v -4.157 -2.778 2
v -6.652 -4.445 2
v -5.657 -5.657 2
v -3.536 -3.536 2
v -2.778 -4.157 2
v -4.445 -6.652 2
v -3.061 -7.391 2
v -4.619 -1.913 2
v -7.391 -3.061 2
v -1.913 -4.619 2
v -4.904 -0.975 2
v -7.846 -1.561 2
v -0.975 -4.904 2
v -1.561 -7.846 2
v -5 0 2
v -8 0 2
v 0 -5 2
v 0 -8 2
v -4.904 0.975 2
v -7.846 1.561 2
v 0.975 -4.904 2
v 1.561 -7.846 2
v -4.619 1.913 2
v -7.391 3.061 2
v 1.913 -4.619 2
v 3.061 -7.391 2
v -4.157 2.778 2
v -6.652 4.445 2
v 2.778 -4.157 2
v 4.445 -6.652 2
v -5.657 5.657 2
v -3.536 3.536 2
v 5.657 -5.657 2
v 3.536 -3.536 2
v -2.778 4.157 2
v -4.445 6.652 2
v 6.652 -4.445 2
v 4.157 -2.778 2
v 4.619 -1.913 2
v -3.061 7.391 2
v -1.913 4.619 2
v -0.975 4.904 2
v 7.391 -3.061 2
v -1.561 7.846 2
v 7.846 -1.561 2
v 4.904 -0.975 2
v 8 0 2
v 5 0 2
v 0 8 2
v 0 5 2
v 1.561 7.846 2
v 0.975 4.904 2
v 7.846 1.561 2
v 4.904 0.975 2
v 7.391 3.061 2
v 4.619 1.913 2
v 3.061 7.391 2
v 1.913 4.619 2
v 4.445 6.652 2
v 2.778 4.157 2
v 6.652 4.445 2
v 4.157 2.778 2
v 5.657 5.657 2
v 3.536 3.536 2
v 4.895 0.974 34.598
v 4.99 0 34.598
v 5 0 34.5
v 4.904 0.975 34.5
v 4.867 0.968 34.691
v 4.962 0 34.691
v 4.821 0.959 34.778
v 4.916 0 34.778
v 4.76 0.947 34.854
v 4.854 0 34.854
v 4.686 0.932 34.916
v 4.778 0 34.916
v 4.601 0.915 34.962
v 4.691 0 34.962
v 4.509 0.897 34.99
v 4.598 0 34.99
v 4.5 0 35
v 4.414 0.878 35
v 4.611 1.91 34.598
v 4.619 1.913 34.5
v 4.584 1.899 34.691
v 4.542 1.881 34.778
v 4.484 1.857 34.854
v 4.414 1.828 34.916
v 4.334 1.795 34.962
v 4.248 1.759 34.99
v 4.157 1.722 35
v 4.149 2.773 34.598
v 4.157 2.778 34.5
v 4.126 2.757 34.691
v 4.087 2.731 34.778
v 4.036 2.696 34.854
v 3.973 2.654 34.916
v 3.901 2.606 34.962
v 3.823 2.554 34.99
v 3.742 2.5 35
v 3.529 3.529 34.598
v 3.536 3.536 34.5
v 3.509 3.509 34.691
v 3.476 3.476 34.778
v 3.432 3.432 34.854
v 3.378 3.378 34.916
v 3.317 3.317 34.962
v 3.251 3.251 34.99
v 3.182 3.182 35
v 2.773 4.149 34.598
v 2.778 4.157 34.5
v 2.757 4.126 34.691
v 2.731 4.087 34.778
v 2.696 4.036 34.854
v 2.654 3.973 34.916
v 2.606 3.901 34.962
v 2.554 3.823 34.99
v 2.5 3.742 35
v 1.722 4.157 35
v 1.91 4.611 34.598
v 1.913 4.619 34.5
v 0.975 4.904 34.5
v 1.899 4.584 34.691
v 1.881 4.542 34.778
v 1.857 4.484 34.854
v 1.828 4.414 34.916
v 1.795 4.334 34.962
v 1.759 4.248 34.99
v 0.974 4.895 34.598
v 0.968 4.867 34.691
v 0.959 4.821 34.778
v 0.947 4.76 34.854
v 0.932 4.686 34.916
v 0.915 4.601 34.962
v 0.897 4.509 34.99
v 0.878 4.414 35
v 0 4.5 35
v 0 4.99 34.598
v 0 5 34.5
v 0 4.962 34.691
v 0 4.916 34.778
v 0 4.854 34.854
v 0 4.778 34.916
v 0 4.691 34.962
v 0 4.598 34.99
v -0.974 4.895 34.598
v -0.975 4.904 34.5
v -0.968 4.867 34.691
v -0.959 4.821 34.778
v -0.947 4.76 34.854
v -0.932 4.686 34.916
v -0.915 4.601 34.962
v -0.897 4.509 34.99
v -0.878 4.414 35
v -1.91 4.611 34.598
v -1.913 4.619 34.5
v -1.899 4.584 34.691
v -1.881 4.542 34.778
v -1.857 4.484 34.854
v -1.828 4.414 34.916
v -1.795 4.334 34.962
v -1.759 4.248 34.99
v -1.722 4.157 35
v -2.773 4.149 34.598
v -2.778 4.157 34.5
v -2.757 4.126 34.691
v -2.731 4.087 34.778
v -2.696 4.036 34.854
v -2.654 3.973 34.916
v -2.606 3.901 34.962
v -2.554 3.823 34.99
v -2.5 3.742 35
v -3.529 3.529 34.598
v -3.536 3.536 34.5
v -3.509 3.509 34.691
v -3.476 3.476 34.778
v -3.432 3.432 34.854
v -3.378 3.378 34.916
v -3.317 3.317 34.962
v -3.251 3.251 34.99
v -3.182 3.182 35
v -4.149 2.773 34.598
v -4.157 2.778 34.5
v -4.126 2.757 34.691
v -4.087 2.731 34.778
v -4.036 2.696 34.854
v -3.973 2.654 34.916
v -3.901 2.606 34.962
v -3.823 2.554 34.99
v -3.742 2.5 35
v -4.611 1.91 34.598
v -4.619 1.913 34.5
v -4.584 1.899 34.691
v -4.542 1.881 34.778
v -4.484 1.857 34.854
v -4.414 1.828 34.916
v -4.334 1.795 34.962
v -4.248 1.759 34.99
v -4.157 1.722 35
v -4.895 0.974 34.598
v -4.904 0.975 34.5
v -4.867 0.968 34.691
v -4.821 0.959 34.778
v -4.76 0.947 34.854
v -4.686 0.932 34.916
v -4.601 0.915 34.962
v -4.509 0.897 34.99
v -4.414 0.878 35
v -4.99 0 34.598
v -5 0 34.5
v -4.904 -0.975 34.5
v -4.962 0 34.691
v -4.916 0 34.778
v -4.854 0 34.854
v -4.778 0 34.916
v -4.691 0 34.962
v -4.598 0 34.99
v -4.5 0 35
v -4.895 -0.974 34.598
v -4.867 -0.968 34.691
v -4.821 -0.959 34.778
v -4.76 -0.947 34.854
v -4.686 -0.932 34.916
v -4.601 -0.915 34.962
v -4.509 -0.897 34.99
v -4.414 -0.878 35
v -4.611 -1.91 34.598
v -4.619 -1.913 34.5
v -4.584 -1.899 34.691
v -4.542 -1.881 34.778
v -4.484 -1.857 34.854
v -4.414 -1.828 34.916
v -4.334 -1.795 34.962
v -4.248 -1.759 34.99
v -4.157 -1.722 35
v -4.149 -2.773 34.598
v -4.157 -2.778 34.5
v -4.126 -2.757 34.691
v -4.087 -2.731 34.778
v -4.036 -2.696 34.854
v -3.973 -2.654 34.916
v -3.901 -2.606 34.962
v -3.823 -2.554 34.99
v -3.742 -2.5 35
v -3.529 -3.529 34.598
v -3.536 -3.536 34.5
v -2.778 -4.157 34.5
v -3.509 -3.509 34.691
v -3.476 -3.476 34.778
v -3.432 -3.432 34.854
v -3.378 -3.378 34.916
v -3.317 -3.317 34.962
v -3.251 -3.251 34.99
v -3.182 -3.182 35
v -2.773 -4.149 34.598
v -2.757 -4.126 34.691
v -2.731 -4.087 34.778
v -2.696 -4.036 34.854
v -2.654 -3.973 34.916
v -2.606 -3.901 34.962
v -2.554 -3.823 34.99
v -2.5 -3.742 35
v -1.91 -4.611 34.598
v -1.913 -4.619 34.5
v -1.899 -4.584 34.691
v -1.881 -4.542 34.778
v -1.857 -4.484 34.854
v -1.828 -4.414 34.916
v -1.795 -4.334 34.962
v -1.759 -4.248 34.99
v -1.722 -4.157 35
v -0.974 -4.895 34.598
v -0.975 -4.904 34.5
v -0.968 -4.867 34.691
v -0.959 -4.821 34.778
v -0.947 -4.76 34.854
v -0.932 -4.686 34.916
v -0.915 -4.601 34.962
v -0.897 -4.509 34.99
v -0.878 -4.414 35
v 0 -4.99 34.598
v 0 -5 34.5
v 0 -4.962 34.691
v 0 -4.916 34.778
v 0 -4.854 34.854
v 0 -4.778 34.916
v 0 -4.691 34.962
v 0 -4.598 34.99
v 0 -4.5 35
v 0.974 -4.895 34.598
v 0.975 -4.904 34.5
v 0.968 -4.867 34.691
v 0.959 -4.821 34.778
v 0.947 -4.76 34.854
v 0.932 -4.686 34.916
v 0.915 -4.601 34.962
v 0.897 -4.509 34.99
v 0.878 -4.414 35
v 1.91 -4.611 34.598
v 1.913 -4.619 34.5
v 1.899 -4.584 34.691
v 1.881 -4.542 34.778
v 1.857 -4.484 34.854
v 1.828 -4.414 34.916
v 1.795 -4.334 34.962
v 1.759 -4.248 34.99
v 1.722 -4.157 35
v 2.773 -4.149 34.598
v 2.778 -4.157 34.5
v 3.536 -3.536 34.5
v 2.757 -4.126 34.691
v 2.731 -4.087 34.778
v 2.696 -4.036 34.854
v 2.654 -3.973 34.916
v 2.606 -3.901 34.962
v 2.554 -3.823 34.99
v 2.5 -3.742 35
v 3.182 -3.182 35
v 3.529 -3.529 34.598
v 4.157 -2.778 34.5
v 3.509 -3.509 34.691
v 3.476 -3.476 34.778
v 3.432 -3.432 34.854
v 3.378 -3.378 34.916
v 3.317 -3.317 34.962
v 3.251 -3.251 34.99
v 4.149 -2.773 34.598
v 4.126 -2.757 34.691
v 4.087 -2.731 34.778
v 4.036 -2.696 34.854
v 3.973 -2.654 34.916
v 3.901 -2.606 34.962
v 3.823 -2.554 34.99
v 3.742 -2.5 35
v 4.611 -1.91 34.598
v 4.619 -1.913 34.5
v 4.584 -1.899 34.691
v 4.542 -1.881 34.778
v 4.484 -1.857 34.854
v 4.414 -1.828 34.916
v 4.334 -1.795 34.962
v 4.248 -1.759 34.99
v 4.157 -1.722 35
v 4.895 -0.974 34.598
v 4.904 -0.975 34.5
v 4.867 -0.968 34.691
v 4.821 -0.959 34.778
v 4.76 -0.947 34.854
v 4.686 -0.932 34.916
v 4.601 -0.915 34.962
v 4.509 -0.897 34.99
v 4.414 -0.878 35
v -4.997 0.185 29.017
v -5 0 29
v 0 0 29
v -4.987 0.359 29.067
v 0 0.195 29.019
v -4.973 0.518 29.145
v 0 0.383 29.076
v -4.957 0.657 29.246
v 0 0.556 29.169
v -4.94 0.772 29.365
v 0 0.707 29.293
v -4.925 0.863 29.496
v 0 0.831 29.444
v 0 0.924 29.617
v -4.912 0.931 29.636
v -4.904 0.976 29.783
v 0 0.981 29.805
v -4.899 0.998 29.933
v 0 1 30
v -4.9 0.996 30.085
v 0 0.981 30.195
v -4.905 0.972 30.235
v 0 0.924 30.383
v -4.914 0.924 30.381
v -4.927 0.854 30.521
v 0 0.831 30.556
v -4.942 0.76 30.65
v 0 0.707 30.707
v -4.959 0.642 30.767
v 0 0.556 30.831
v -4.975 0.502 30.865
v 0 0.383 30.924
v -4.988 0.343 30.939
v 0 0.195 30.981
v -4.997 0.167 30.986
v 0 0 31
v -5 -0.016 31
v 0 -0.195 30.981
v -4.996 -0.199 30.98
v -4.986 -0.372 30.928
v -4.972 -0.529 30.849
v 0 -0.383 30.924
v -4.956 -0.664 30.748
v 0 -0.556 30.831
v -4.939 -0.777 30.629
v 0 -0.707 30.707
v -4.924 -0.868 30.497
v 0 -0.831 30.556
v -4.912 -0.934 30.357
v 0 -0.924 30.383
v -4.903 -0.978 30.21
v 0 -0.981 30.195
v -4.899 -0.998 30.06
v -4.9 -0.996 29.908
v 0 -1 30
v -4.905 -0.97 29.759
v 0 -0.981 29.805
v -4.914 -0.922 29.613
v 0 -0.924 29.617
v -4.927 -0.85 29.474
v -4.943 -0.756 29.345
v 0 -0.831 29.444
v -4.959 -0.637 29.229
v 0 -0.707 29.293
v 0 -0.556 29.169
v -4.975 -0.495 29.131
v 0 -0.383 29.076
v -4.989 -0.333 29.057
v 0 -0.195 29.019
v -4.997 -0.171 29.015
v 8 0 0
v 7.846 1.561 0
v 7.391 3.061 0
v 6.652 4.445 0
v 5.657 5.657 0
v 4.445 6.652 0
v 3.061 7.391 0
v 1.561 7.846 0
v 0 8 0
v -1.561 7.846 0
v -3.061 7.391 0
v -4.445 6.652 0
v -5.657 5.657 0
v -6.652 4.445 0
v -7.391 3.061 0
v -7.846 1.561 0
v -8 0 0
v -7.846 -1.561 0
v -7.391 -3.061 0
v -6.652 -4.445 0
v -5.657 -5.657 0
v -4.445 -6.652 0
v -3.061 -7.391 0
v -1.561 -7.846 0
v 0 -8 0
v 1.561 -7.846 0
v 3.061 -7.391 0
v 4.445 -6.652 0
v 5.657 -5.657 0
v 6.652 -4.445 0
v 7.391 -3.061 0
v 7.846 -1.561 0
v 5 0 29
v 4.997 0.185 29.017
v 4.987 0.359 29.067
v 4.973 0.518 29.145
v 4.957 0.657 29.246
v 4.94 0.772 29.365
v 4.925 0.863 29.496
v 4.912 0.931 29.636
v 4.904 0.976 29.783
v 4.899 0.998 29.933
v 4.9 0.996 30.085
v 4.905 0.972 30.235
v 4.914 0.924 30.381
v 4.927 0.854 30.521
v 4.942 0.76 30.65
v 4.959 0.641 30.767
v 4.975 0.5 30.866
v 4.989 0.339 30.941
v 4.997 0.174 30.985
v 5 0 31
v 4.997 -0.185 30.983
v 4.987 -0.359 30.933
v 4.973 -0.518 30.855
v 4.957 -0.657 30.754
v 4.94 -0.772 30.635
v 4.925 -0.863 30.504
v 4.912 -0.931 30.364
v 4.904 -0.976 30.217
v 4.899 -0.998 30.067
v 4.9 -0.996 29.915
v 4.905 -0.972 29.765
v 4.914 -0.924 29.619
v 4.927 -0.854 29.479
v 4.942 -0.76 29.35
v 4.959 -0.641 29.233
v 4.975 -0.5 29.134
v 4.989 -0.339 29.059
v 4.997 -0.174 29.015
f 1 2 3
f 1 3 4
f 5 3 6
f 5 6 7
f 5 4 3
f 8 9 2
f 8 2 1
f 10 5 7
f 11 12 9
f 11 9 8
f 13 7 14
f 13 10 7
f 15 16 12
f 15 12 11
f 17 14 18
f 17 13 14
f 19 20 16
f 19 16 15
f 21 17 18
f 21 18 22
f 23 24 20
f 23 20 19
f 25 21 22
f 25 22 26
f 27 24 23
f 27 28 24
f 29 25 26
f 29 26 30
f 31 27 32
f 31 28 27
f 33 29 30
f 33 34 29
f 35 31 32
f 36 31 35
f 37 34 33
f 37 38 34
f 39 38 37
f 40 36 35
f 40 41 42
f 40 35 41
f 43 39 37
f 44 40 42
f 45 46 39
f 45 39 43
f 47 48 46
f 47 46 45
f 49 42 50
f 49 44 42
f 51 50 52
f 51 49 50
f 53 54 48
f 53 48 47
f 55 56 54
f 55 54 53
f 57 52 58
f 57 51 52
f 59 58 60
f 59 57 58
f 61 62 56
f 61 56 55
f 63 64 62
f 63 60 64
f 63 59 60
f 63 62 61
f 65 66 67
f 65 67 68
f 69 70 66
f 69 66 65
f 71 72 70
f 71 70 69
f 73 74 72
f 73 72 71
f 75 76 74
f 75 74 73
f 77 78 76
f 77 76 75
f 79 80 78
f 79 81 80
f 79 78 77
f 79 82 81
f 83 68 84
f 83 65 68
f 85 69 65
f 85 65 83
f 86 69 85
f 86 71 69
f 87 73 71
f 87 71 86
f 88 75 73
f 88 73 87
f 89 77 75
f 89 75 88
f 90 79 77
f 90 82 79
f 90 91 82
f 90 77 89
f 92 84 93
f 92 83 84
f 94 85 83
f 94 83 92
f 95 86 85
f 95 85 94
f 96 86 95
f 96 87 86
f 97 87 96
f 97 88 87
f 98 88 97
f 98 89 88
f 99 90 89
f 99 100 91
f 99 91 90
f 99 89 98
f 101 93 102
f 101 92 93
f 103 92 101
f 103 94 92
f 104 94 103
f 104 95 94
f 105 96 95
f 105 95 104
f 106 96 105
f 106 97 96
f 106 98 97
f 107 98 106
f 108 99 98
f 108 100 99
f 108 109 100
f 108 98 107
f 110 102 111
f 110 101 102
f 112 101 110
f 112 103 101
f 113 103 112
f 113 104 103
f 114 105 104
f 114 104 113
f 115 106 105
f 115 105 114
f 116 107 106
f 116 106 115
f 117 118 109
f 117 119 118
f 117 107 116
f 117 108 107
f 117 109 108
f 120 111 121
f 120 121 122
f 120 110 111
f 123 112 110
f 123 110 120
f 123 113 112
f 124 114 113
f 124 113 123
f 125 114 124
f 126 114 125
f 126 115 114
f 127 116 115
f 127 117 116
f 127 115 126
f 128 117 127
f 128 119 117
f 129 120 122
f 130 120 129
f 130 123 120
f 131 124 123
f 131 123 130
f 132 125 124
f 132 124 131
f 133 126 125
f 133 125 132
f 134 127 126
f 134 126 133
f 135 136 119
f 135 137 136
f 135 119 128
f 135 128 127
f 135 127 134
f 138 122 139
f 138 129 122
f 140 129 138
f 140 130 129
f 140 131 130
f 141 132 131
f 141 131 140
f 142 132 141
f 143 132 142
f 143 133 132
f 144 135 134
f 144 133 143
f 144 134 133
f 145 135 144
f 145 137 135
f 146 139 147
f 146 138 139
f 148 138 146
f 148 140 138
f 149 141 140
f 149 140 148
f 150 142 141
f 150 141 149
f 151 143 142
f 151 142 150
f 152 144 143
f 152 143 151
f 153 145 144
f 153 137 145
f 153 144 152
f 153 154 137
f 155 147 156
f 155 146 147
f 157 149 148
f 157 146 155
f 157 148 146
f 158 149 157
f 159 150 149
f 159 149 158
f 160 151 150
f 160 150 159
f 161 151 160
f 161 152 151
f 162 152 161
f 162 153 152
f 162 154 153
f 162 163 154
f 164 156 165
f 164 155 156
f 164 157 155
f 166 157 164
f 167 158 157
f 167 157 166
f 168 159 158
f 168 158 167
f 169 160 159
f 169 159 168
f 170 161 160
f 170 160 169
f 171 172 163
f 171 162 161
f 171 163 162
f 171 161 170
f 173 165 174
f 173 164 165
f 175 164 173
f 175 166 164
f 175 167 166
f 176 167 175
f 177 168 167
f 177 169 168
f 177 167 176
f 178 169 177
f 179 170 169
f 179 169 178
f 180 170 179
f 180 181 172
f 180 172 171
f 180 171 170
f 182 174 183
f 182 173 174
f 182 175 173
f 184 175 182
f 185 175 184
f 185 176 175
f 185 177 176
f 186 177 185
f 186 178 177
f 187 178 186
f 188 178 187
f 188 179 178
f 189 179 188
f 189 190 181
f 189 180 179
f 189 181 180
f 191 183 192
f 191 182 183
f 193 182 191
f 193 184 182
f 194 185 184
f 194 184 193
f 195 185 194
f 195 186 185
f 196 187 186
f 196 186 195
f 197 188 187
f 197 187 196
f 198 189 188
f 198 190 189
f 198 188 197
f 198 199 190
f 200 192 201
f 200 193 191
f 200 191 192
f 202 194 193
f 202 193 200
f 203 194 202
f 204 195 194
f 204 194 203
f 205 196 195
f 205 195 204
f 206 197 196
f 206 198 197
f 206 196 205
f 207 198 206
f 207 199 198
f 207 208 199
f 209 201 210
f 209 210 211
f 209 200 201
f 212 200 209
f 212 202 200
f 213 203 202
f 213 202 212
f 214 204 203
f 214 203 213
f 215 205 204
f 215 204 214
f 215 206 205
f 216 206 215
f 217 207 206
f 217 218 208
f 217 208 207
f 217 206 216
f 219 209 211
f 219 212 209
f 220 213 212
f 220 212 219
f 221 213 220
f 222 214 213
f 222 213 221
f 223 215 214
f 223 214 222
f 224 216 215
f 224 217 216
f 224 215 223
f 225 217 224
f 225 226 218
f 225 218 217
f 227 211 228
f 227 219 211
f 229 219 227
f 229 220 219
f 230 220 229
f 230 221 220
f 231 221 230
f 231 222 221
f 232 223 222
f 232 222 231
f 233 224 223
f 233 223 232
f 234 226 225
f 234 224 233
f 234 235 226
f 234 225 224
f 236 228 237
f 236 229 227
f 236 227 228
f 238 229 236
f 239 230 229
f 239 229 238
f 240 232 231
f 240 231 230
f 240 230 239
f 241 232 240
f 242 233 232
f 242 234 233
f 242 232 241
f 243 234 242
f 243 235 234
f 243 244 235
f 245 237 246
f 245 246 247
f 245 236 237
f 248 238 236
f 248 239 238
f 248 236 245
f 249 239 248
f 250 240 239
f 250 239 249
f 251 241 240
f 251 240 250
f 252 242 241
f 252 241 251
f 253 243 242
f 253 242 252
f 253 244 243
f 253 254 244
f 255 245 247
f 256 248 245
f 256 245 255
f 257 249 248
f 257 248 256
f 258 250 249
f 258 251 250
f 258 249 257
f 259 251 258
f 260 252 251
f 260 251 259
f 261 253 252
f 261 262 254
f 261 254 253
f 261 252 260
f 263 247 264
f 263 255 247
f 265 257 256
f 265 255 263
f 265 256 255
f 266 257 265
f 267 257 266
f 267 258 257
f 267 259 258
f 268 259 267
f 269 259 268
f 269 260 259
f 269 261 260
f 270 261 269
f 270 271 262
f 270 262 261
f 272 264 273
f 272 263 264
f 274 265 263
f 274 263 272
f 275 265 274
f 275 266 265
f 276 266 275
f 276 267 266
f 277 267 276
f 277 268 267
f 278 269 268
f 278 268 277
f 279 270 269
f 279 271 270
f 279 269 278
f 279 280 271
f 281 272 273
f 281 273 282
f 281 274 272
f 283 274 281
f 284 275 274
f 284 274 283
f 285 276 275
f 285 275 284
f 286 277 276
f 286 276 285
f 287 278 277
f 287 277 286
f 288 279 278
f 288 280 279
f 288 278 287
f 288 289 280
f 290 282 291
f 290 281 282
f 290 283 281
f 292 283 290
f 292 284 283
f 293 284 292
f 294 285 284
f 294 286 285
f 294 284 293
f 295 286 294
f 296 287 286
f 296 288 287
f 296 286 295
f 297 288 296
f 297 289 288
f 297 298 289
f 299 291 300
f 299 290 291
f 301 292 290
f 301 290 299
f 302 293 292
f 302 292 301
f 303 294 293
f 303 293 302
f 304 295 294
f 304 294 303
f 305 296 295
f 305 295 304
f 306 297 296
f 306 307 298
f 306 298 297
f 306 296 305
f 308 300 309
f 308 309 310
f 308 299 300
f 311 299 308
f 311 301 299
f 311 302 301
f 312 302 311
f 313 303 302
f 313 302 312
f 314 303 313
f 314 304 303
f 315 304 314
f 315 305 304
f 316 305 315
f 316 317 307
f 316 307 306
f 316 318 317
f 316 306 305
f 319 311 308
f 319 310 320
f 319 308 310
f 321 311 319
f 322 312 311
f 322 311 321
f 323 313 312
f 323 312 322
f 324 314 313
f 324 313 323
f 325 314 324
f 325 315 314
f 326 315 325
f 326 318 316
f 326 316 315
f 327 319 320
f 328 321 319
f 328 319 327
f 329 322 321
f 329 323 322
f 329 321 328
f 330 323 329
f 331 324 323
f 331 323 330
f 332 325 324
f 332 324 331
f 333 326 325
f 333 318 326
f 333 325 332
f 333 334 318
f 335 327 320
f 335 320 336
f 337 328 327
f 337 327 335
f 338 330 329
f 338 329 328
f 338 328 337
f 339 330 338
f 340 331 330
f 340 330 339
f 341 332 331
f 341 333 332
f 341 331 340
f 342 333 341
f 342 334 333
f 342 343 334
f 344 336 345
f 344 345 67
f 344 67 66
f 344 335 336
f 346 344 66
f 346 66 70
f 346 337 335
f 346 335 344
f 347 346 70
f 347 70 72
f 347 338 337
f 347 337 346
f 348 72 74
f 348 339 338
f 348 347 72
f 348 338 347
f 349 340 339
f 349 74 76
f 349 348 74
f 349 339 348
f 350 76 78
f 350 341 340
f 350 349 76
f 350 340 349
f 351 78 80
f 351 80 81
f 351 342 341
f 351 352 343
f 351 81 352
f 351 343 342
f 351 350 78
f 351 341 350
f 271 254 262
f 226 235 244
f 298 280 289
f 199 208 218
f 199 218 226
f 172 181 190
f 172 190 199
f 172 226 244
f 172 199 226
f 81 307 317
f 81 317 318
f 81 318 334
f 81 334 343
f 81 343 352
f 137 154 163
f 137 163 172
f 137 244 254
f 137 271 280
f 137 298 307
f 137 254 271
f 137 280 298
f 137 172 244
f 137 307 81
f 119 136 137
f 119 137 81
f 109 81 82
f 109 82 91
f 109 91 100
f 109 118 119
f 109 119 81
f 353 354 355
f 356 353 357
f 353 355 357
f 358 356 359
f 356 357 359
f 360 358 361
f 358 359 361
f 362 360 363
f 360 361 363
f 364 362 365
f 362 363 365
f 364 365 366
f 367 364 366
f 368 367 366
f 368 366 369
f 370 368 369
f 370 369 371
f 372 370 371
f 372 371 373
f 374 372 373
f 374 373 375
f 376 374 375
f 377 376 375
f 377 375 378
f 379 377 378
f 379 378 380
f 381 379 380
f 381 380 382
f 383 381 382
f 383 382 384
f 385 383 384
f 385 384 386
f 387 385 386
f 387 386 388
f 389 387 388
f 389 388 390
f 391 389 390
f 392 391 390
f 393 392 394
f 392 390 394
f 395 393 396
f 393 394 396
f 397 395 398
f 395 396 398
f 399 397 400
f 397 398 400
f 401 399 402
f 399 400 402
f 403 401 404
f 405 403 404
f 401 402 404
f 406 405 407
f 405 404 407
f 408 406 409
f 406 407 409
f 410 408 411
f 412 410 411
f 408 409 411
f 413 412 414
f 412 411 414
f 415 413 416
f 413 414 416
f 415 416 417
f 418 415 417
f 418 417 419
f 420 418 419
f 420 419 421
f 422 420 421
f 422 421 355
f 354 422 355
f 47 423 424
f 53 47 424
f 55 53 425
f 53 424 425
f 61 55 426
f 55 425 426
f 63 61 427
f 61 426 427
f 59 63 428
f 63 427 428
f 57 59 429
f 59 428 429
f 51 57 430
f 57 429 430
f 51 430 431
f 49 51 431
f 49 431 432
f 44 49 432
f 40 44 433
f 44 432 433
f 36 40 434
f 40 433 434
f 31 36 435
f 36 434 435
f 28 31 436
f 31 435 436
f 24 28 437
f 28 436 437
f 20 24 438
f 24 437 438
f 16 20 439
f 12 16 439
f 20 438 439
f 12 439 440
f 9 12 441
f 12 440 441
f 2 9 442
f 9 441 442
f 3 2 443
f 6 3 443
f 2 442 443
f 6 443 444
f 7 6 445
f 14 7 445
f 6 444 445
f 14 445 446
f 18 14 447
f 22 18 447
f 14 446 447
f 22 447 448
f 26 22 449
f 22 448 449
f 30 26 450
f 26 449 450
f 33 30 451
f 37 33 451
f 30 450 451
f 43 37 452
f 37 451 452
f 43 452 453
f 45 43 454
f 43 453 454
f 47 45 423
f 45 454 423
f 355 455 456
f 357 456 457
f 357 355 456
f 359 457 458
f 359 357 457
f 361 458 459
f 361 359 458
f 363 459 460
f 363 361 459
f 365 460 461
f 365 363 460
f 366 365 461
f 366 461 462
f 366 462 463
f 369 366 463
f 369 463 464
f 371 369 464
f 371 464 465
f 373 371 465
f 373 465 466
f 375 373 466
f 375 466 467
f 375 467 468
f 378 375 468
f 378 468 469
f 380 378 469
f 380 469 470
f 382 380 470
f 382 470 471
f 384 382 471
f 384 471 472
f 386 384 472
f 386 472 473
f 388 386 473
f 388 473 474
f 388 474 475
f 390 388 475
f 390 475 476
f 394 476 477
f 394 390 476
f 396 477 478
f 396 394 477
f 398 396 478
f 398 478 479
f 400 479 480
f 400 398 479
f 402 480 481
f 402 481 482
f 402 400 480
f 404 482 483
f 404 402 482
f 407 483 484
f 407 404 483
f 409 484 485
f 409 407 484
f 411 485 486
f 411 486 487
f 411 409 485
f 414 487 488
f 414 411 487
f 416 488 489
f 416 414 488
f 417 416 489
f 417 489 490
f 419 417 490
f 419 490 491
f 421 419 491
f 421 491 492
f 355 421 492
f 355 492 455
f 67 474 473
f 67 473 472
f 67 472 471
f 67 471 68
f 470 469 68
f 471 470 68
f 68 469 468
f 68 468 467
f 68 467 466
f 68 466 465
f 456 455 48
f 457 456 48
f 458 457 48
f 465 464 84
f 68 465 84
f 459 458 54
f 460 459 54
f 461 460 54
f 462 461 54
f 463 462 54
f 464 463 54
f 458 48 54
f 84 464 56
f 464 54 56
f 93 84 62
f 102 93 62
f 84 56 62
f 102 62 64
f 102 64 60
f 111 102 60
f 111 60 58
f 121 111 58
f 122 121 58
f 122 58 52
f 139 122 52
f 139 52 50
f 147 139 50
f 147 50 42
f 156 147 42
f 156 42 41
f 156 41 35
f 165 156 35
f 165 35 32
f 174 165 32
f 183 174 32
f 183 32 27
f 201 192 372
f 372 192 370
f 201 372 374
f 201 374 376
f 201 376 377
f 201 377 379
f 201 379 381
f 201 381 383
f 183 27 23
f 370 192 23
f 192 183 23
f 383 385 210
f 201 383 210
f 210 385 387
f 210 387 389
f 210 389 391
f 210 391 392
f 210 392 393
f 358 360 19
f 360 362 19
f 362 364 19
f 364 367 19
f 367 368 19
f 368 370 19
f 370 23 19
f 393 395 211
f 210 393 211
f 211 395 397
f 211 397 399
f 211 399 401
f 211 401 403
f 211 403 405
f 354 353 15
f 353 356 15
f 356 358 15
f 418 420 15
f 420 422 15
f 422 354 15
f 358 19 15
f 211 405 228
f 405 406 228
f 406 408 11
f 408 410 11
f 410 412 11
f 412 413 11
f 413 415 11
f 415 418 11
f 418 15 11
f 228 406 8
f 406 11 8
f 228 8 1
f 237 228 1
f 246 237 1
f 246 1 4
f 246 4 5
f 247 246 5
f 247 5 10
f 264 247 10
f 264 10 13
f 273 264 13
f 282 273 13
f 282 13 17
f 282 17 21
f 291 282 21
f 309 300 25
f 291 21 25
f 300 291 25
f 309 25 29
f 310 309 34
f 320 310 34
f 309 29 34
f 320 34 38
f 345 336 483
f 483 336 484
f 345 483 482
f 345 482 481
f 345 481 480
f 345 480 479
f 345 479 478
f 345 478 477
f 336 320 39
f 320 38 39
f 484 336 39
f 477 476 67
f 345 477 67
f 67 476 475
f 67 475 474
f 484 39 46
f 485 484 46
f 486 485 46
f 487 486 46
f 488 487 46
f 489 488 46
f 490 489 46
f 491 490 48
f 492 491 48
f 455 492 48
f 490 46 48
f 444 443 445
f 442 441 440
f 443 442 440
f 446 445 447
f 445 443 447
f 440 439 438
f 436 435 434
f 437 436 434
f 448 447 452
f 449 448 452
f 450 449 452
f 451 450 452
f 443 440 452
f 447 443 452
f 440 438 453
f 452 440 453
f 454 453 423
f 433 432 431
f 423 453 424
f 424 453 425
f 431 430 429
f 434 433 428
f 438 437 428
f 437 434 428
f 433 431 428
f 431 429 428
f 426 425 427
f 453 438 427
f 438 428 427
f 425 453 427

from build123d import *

# Parameters (mm, degrees)
SKETCH1_R               = 5
BOSS_EXTRUDE1_DEPTH     = 35
SKETCH1_3_R             = 8
SKETCH1_3_R_2           = 5
BOSS_EXTRUDE2_DEPTH     = 2
SKETCH3_R               = 1
CUT_EXTRUDE3_DEPTH      = 9
CUT_EXTRUDE3_DEPTH_BACK = 9
FILLET1_R               = 0.5


with BuildPart() as part:
    # Sketch1 → Boss-Extrude1 (new body)
    with BuildSketch(Plane.XY):
        Circle(SKETCH1_R)
    extrude(amount=BOSS_EXTRUDE1_DEPTH)

    # Sketch1<3> → Boss-Extrude2 (add)
    with BuildSketch(Plane.XY):
        Circle(SKETCH1_3_R)
        Circle(SKETCH1_3_R_2, mode=Mode.SUBTRACT)
    extrude(amount=BOSS_EXTRUDE2_DEPTH)

    # Sketch3 → Cut-Extrude3 (cut, two sides)
    with BuildSketch(Plane(origin=(0, 0, 0), x_dir=(0, 0, -1), z_dir=(1, 0, 0))) as cut_extrude3_sk:
        with Locations((-30, 0)):
            Circle(SKETCH3_R)
    extrude(amount=CUT_EXTRUDE3_DEPTH, mode=Mode.SUBTRACT)
    extrude(cut_extrude3_sk.sketch, amount=-CUT_EXTRUDE3_DEPTH_BACK, mode=Mode.SUBTRACT)

    # Fillet1
    fillet1_edges = [part.edges().sort_by_distance(p)[0] for p in [
        (-5, 0, 35),
    ]]
    fillet(fillet1_edges, radius=FILLET1_R)


solid = part.part
